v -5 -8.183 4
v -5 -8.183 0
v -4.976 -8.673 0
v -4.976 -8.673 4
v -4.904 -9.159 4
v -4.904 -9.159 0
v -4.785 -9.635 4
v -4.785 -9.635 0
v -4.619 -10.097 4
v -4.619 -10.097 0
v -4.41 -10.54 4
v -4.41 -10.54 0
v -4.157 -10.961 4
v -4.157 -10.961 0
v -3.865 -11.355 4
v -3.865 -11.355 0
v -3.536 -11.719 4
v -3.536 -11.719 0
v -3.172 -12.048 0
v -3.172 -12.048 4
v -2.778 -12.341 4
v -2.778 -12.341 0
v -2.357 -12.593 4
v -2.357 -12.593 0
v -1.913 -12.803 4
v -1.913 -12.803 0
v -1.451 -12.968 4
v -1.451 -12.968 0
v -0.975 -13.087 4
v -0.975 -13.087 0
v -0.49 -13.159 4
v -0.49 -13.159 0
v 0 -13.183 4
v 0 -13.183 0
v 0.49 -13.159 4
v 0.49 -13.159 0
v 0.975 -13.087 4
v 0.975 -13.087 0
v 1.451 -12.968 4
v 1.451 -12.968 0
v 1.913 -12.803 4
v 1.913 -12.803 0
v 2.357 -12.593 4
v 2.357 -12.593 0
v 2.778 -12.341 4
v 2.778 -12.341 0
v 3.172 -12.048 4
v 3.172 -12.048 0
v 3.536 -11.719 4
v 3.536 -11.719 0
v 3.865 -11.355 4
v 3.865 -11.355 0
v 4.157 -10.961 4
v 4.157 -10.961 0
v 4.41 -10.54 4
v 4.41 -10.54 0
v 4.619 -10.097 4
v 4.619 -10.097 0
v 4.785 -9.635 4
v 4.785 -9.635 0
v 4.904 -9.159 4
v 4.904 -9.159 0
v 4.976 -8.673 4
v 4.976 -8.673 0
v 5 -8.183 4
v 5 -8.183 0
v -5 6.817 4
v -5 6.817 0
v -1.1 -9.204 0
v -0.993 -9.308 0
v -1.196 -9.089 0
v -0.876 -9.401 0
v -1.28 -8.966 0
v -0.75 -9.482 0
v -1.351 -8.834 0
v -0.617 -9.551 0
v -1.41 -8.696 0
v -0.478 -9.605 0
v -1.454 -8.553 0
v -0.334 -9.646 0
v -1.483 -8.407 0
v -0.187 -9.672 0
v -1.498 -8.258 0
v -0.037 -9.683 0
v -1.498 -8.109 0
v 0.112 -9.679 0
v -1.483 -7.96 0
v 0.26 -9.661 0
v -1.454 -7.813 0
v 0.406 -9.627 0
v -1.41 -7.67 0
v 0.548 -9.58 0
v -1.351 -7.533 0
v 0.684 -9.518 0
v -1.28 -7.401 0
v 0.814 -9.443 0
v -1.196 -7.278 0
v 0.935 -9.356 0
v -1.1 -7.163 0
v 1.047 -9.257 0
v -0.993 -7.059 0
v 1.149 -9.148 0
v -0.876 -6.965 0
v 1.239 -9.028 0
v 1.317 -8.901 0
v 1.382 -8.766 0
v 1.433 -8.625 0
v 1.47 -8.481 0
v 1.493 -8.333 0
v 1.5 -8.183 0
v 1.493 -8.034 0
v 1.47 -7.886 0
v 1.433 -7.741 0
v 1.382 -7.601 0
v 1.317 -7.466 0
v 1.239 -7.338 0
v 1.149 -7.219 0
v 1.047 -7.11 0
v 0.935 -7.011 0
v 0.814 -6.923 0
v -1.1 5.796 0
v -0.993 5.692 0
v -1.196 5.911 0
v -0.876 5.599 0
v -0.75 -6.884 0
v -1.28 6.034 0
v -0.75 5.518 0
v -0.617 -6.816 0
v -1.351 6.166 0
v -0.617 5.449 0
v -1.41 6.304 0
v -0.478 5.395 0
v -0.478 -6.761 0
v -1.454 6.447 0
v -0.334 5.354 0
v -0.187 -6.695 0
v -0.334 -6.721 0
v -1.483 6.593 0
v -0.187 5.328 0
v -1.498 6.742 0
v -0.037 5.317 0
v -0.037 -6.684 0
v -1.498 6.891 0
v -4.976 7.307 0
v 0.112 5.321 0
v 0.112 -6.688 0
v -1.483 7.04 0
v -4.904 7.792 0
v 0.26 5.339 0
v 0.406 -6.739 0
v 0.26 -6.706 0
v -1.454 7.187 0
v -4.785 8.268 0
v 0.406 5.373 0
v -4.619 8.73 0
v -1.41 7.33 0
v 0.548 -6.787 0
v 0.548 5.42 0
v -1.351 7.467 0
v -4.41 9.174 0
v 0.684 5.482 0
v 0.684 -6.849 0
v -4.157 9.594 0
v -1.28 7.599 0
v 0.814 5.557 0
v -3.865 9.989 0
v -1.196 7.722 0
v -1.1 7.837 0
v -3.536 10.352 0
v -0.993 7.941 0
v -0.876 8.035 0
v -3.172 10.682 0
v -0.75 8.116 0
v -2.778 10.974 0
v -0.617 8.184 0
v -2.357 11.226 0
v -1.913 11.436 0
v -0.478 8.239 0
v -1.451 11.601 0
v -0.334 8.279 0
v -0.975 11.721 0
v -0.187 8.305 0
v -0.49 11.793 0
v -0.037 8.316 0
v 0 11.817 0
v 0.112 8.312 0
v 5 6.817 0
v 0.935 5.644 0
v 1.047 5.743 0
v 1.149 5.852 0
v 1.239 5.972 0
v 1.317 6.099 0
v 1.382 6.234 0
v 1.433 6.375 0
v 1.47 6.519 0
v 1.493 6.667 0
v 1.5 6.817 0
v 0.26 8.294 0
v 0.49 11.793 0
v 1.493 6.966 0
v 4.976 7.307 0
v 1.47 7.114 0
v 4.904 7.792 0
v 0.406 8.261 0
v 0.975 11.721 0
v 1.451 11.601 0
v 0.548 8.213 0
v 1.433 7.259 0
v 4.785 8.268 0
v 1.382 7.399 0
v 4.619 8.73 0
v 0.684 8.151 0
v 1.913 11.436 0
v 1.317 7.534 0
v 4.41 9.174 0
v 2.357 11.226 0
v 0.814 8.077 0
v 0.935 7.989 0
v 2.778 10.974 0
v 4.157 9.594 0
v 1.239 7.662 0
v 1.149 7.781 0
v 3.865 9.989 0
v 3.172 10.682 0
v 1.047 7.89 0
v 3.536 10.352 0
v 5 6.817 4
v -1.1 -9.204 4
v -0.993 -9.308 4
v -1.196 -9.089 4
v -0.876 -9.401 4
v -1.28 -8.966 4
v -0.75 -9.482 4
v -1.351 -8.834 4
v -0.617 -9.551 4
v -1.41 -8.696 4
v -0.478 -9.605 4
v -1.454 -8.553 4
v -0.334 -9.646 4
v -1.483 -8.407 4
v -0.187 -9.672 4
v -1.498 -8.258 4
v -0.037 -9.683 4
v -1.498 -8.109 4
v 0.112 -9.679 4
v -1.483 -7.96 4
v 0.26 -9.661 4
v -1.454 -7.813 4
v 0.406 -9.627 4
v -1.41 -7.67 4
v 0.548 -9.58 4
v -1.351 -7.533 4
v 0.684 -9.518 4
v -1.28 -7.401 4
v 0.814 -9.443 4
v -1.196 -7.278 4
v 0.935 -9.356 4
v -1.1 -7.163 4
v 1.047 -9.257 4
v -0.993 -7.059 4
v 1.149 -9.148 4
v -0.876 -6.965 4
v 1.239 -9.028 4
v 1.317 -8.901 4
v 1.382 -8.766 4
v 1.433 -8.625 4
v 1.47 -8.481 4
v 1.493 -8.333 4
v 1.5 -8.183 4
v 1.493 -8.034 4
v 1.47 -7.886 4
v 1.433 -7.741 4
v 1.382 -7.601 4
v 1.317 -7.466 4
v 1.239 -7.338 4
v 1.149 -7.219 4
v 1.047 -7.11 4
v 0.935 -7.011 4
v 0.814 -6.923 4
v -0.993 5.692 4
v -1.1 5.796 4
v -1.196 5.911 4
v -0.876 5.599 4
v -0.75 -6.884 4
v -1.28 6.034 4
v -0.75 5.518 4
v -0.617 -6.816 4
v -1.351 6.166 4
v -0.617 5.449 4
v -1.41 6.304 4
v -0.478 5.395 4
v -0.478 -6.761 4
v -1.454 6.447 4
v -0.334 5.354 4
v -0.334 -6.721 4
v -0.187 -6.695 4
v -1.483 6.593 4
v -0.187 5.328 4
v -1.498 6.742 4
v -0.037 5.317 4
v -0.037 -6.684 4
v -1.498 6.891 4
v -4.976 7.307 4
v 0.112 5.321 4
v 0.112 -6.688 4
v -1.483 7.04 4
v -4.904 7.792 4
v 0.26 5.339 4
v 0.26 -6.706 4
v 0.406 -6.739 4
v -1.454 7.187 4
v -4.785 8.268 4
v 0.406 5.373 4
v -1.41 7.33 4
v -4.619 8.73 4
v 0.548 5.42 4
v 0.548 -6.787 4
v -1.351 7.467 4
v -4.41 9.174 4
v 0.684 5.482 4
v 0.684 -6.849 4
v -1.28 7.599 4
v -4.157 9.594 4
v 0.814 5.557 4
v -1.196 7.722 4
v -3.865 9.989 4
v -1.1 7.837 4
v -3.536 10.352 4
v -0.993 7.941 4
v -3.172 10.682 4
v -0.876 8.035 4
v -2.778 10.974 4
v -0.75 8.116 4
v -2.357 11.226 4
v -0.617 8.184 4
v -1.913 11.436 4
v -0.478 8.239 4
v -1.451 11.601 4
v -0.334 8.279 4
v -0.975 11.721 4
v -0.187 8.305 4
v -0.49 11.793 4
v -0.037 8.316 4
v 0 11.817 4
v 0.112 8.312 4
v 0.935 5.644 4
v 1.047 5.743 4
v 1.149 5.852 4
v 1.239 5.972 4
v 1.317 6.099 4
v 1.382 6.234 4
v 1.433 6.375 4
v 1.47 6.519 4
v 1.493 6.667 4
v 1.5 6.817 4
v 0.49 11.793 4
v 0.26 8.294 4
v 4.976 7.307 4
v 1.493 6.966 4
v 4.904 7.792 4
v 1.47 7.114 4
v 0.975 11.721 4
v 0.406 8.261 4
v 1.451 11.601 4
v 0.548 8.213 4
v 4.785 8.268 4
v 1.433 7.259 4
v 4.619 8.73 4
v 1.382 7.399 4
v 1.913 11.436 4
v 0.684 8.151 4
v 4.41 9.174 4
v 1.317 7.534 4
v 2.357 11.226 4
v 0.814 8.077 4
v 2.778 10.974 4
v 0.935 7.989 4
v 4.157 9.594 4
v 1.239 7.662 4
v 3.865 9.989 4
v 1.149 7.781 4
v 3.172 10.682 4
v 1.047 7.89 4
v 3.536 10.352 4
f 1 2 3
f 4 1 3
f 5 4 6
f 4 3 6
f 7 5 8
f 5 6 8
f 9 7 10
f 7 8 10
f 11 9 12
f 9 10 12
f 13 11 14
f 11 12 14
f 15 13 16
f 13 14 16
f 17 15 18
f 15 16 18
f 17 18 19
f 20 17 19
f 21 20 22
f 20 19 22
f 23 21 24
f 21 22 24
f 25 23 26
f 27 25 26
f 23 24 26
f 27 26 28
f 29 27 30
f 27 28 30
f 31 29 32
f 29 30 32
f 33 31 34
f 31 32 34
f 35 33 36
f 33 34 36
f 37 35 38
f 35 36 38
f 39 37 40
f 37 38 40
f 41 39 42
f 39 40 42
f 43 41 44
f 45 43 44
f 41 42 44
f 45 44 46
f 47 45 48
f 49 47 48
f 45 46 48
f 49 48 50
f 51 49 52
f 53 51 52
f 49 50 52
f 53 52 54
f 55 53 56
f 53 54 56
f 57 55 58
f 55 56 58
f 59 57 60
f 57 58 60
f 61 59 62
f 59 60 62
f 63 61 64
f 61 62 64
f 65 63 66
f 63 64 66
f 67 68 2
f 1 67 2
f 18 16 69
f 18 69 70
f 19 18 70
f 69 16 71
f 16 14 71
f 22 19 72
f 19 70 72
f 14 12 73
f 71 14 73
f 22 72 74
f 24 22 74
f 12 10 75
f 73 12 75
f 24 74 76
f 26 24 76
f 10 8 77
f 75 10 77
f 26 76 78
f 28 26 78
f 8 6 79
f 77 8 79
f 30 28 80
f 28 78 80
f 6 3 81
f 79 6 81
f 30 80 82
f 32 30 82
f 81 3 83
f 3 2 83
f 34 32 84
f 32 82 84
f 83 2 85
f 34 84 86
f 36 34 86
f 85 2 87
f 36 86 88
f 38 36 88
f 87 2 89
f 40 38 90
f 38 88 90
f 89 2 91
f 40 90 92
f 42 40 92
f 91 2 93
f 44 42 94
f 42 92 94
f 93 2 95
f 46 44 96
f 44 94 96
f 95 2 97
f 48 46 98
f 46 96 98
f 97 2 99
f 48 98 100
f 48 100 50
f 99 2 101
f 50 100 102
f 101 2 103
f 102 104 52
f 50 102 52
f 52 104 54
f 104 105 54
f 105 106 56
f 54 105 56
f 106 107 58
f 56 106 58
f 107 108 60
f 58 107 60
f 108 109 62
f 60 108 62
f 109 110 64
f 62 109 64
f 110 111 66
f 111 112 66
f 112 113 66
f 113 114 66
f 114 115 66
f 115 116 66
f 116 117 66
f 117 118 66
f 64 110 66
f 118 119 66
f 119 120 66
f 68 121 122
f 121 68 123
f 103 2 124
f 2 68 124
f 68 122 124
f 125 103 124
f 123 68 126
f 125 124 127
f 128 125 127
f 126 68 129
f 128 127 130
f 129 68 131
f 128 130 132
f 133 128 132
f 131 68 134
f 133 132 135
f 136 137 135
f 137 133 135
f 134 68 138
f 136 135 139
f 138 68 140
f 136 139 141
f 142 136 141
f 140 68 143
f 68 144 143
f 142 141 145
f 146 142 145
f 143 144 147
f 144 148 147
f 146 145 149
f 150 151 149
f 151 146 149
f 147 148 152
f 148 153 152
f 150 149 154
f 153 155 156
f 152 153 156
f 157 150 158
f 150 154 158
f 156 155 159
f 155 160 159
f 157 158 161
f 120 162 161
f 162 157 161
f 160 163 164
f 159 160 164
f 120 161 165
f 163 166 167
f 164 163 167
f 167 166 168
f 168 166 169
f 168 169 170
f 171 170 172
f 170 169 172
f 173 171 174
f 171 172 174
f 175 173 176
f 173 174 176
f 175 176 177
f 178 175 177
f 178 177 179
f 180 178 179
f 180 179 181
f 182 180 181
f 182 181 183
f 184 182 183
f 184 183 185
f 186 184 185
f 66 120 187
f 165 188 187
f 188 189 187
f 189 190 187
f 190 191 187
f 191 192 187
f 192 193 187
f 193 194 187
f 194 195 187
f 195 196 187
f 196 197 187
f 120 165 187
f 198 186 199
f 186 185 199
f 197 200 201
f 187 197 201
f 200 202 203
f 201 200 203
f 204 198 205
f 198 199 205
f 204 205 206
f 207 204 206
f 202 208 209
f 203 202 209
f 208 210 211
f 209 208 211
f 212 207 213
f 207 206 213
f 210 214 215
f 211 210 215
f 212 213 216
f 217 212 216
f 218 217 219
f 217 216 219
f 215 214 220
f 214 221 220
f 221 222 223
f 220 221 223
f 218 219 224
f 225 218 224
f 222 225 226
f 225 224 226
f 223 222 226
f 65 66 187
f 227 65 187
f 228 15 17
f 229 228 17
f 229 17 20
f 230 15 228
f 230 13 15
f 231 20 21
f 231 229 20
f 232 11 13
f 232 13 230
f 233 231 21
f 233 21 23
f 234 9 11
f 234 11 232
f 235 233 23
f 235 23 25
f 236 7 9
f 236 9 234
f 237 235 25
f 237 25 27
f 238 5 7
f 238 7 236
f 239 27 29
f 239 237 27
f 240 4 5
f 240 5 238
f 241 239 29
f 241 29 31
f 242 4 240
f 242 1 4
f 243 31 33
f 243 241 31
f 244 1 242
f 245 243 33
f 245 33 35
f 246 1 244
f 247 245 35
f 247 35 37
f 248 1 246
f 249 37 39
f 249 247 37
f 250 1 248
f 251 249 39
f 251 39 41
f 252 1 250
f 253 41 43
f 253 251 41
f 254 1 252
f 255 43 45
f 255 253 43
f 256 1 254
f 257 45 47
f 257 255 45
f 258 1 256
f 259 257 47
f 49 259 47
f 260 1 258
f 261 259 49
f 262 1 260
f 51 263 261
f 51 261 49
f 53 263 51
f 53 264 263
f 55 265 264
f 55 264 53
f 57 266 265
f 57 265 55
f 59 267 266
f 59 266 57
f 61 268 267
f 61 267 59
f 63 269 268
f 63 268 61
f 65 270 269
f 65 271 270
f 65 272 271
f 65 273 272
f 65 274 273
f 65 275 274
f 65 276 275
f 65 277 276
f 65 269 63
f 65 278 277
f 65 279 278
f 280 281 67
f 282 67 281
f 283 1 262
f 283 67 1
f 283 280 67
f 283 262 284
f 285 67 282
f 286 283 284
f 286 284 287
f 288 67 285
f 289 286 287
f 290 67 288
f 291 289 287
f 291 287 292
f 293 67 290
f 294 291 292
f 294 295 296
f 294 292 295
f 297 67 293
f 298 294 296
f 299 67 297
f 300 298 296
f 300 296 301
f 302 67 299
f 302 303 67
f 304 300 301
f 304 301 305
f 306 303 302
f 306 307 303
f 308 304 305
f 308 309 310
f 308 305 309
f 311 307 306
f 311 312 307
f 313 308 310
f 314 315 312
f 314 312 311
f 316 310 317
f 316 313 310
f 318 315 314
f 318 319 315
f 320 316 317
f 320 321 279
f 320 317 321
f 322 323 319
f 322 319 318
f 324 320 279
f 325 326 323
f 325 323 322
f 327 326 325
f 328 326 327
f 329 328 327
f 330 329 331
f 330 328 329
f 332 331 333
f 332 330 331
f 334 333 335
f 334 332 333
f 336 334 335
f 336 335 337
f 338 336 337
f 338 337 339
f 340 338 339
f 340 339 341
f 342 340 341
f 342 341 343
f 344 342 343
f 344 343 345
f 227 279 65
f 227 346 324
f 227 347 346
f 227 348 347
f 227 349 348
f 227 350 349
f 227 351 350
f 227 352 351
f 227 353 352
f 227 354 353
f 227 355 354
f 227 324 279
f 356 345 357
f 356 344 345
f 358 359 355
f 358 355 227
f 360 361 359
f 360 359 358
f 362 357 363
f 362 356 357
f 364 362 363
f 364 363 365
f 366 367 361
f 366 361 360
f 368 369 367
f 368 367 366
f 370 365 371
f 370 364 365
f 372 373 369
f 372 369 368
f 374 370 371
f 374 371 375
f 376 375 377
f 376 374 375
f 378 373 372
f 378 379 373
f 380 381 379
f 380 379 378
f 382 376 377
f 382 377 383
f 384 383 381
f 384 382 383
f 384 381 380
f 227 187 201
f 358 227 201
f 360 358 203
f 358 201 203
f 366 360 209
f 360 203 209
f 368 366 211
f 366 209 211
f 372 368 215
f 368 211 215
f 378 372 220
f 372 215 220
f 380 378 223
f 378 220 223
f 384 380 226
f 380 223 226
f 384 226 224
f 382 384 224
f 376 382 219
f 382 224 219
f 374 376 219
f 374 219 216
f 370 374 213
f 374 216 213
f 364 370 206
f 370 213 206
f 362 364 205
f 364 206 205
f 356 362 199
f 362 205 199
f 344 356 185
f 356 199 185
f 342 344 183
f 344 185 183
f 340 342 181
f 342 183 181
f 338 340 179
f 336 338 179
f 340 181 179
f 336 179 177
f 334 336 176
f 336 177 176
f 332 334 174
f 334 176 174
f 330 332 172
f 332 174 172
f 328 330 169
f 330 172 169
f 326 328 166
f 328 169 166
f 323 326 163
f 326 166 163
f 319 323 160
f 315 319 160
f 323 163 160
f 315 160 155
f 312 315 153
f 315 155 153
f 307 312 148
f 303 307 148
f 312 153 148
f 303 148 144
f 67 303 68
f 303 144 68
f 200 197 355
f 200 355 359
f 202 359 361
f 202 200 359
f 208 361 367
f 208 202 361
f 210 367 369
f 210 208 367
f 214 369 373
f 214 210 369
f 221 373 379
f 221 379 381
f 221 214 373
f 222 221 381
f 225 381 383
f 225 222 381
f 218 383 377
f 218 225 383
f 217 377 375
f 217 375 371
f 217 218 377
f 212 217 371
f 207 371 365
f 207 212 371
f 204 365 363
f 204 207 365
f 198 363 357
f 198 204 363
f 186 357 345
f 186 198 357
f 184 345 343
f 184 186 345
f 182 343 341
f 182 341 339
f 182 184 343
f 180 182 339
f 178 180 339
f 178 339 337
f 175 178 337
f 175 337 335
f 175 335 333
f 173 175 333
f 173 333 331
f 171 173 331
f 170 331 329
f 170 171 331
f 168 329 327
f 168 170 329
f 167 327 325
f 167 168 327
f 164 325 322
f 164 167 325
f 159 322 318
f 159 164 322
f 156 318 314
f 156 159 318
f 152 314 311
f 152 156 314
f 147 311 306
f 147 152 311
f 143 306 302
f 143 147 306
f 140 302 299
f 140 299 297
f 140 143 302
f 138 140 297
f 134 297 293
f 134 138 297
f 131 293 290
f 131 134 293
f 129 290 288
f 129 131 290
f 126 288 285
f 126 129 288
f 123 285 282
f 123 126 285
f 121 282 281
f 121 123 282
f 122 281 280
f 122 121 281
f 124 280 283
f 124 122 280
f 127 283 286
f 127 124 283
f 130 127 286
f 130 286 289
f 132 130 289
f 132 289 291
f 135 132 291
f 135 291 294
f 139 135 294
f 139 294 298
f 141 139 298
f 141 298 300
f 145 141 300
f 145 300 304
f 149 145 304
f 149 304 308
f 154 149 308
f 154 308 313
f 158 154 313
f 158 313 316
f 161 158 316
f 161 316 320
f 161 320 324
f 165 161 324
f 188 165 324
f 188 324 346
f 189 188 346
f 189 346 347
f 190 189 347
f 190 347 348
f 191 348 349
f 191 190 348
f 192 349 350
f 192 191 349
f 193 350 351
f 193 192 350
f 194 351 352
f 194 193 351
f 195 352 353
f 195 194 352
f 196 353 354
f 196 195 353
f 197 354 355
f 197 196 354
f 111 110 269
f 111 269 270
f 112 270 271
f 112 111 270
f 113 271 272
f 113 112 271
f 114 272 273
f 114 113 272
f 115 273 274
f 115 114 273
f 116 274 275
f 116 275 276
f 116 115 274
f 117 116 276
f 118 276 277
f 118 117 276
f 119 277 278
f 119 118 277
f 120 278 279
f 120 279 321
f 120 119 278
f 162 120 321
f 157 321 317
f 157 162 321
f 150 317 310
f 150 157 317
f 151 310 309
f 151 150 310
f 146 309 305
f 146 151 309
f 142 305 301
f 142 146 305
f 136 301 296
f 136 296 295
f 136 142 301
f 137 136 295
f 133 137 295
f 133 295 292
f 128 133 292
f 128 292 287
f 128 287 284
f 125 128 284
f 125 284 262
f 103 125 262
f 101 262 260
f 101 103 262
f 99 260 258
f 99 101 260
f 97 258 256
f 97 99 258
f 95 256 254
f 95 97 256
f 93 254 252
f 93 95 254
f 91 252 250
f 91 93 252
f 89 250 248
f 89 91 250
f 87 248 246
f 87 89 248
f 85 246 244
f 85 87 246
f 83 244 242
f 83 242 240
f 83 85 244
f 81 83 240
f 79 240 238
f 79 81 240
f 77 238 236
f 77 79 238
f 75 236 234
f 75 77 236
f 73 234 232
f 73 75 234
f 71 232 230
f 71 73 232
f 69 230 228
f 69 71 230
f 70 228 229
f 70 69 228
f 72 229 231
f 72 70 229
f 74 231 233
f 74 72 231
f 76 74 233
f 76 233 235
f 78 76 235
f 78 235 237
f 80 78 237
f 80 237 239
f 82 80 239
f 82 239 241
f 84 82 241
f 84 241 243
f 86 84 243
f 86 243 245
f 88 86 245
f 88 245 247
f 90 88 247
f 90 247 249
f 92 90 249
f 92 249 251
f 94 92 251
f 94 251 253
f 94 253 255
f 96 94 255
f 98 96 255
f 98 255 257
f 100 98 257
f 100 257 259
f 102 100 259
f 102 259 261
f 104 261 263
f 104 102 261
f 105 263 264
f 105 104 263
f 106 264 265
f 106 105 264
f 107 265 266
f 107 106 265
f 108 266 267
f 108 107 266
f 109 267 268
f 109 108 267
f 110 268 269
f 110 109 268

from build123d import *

# Parameters (mm, degrees)
F0_R     = 1.5
F1_DEPTH = 4


with BuildPart() as f1:
    # F0 (on Top) → F1 (new body)
    with BuildSketch(Plane.XY):
        with BuildLine():
            ThreePointArc((-5, 6.816642), (0, 1.816642), (5, 6.816642))
            ThreePointArc((5, 6.816642), (0, 11.816642), (-5, 6.816642))
        make_face()
        with Locations((0, 6.816642)):
            Circle(F0_R, mode=Mode.SUBTRACT)
        with BuildLine():
            Line((5, -8.183358), (5, 6.816642))
            ThreePointArc((5, 6.816642), (0, 1.816642), (-5, 6.816642))
            Line((-5, 6.816642), (-5, -8.183358))
            ThreePointArc((-5, -8.183358), (0, -3.183358), (5, -8.183358))
        make_face()
        with BuildLine():
            ThreePointArc((-5, -8.183358), (0, -13.183358), (5, -8.183358))
            ThreePointArc((5, -8.183358), (0, -3.183358), (-5, -8.183358))
        make_face()
        with Locations((0, -8.183358)):
            Circle(F0_R, mode=Mode.SUBTRACT)
    extrude(amount=F1_DEPTH)


solid = f1.part
